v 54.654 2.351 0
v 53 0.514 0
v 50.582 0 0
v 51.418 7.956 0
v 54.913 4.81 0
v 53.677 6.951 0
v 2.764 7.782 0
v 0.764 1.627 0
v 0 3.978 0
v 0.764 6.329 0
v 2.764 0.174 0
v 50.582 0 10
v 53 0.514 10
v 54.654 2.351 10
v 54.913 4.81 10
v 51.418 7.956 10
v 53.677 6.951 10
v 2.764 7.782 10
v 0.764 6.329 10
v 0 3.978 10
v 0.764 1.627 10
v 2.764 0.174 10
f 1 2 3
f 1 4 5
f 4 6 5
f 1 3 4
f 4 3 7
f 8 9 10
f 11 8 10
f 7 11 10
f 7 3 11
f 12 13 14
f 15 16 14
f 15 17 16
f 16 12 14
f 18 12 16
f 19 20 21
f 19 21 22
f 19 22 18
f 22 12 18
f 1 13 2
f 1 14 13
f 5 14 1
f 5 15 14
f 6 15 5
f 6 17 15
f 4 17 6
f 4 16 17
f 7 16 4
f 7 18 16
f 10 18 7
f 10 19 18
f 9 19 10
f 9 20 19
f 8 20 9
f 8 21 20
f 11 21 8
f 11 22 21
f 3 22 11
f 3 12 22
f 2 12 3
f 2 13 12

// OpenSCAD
$fn = 32;

// ----------------------------------------------------------------------
// Key bar: parallel key, 10 mm thick
// ----------------------------------------------------------------------

// --- parameters (mm) ---
profile_height = 10;      // extrusion height
profile_points = 11;      // points of the closed outline

profile = [[0, 3.978], [0.764, 1.627], [2.764, 0.174], [50.582, 0], [53, 0.514], [54.654, 2.351], [54.913, 4.81], [53.677, 6.951], [51.418, 7.956], [2.764, 7.782], [0.764, 6.329]];  // single closed polygon, 11 points, counter clockwise

// --- the one profile operation ---
linear_extrude(height = profile_height) polygon(points = profile);
